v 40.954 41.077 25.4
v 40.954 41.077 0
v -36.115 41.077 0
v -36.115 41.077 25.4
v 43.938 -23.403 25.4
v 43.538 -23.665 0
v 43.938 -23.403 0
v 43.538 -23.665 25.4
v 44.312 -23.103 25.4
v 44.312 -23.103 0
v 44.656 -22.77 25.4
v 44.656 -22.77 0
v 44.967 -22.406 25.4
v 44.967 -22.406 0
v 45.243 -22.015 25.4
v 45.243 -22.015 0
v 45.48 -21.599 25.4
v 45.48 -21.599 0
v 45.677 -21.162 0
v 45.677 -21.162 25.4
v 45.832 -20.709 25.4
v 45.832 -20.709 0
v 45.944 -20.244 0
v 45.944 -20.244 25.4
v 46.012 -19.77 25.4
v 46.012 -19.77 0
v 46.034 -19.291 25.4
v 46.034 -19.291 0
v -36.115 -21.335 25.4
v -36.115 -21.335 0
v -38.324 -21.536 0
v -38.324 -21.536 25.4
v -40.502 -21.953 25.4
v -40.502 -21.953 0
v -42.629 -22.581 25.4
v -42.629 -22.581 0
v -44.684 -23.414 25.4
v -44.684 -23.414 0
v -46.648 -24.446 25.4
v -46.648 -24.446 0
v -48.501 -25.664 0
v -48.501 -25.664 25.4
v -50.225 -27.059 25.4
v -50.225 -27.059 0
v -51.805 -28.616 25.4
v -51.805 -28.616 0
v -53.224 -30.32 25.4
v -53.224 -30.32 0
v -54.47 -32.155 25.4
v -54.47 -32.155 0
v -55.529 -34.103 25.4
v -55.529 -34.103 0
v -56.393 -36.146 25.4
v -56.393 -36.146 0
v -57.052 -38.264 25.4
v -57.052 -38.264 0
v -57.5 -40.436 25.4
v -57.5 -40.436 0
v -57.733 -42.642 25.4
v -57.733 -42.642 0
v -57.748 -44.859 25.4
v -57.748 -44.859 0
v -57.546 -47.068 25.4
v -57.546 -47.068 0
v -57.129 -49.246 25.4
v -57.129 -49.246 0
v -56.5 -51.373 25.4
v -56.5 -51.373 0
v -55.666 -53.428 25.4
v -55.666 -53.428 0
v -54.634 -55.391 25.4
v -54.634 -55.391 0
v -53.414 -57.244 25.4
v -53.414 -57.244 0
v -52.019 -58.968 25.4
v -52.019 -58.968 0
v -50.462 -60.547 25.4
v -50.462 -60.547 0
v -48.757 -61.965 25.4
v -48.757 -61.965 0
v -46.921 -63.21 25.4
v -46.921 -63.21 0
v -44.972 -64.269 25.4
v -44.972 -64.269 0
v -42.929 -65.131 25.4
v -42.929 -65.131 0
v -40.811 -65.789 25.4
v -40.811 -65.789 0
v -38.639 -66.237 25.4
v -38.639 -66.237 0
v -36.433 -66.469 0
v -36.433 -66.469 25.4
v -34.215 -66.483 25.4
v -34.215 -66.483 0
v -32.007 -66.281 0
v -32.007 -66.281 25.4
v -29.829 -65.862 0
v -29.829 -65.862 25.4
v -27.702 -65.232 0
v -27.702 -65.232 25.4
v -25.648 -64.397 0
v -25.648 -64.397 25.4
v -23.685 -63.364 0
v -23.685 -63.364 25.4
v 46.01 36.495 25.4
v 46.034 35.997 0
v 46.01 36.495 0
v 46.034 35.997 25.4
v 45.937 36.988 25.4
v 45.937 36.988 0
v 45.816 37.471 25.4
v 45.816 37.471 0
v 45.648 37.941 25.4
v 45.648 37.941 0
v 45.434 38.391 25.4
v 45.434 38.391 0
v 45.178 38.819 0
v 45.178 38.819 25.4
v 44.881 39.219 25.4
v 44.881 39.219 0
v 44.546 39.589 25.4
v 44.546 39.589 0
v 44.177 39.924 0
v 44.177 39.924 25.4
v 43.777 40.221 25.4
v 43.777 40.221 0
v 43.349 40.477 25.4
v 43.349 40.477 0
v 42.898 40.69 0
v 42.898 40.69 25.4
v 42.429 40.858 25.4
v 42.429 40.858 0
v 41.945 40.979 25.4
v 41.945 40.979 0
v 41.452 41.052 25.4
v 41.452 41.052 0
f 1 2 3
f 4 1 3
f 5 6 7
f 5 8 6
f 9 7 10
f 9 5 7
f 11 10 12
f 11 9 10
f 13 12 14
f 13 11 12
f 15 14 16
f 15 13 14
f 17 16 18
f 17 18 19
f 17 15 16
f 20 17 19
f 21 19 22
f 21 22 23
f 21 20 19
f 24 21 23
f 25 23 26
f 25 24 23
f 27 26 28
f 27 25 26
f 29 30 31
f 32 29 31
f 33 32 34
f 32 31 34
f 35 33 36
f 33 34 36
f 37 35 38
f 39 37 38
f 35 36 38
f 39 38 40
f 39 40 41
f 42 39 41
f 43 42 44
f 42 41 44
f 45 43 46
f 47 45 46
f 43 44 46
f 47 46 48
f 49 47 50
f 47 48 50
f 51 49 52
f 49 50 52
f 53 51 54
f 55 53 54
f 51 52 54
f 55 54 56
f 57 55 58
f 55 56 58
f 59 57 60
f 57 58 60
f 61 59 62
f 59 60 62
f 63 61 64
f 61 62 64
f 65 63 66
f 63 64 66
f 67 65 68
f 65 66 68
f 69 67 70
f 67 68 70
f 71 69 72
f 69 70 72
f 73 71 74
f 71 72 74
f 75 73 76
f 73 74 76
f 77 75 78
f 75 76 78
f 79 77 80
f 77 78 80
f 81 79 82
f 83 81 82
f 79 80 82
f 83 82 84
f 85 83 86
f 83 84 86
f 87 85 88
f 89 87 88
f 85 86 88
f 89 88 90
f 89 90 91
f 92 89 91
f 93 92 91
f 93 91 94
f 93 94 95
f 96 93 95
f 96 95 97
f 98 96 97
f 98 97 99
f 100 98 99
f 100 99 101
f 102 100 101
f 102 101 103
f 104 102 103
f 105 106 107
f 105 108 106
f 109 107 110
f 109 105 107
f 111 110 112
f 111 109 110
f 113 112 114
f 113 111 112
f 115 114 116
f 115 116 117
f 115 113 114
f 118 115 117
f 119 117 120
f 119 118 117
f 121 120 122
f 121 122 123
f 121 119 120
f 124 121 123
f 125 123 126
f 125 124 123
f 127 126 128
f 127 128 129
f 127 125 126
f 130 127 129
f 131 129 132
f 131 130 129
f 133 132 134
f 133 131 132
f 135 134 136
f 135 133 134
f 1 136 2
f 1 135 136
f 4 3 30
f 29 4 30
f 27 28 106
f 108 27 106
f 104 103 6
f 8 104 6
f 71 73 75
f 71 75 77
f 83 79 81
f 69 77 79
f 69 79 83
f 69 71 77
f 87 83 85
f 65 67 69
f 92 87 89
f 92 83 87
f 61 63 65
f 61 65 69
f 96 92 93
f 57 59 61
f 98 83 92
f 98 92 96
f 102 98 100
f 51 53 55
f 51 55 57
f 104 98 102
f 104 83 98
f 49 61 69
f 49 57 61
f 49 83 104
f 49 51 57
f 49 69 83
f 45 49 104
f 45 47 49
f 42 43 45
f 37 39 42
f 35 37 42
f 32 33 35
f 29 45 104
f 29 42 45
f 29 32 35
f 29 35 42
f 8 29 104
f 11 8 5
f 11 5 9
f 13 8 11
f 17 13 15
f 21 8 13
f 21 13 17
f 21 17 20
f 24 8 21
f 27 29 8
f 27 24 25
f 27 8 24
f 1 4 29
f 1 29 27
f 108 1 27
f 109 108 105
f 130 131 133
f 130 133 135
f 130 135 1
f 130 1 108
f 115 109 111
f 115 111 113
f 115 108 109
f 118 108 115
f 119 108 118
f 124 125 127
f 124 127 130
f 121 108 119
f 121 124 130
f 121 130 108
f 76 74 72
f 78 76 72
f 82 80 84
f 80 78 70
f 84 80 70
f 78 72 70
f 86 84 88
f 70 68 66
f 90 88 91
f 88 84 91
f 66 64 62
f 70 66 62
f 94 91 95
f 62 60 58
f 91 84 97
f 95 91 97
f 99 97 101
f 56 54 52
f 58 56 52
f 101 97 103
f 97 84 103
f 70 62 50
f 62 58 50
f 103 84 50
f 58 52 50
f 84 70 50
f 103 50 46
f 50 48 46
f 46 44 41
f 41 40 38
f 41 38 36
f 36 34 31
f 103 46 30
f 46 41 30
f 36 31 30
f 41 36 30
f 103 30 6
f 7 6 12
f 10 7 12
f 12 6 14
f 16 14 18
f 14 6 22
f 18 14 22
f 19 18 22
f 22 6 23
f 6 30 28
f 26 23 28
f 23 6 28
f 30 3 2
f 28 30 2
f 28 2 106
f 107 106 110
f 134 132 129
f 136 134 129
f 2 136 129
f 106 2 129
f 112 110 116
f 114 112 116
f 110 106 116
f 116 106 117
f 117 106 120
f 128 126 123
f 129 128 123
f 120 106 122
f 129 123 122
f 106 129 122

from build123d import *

# Parameters (mm, degrees)
F1_DEPTH = 25.4
F2_R     = 5.08
F3_R     = 5.08


with BuildPart() as f1:
    # F0 (on Top) → F1 (new body)
    with BuildSketch(Plane.XY):
        with BuildLine():
            Line((-36.114874, 41.076776), (-36.114874, -21.335141))
            ThreePointArc((-36.114874, -21.335141), (-56.840589, -50.317389), (-23.684892, -63.364446))
            Line((-23.684892, -63.364446), (46.034314, -22.190897))
            Line((46.034314, -22.190897), (46.034314, 41.076776))
            Line((46.034314, 41.076776), (-36.114874, 41.076776))
        make_face()
    extrude(amount=F1_DEPTH)

    # F2
    f2_edges = [f1.edges().sort_by_distance(p)[0] for p in [
        (46.034314, -22.190897, 12.7),
    ]]
    fillet(f2_edges, radius=F2_R)

    # F3
    f3_edges = [f1.edges().sort_by_distance(p)[0] for p in [
        (46.034314, 41.076776, 12.7),
    ]]
    fillet(f3_edges, radius=F3_R)


solid = f1.part
